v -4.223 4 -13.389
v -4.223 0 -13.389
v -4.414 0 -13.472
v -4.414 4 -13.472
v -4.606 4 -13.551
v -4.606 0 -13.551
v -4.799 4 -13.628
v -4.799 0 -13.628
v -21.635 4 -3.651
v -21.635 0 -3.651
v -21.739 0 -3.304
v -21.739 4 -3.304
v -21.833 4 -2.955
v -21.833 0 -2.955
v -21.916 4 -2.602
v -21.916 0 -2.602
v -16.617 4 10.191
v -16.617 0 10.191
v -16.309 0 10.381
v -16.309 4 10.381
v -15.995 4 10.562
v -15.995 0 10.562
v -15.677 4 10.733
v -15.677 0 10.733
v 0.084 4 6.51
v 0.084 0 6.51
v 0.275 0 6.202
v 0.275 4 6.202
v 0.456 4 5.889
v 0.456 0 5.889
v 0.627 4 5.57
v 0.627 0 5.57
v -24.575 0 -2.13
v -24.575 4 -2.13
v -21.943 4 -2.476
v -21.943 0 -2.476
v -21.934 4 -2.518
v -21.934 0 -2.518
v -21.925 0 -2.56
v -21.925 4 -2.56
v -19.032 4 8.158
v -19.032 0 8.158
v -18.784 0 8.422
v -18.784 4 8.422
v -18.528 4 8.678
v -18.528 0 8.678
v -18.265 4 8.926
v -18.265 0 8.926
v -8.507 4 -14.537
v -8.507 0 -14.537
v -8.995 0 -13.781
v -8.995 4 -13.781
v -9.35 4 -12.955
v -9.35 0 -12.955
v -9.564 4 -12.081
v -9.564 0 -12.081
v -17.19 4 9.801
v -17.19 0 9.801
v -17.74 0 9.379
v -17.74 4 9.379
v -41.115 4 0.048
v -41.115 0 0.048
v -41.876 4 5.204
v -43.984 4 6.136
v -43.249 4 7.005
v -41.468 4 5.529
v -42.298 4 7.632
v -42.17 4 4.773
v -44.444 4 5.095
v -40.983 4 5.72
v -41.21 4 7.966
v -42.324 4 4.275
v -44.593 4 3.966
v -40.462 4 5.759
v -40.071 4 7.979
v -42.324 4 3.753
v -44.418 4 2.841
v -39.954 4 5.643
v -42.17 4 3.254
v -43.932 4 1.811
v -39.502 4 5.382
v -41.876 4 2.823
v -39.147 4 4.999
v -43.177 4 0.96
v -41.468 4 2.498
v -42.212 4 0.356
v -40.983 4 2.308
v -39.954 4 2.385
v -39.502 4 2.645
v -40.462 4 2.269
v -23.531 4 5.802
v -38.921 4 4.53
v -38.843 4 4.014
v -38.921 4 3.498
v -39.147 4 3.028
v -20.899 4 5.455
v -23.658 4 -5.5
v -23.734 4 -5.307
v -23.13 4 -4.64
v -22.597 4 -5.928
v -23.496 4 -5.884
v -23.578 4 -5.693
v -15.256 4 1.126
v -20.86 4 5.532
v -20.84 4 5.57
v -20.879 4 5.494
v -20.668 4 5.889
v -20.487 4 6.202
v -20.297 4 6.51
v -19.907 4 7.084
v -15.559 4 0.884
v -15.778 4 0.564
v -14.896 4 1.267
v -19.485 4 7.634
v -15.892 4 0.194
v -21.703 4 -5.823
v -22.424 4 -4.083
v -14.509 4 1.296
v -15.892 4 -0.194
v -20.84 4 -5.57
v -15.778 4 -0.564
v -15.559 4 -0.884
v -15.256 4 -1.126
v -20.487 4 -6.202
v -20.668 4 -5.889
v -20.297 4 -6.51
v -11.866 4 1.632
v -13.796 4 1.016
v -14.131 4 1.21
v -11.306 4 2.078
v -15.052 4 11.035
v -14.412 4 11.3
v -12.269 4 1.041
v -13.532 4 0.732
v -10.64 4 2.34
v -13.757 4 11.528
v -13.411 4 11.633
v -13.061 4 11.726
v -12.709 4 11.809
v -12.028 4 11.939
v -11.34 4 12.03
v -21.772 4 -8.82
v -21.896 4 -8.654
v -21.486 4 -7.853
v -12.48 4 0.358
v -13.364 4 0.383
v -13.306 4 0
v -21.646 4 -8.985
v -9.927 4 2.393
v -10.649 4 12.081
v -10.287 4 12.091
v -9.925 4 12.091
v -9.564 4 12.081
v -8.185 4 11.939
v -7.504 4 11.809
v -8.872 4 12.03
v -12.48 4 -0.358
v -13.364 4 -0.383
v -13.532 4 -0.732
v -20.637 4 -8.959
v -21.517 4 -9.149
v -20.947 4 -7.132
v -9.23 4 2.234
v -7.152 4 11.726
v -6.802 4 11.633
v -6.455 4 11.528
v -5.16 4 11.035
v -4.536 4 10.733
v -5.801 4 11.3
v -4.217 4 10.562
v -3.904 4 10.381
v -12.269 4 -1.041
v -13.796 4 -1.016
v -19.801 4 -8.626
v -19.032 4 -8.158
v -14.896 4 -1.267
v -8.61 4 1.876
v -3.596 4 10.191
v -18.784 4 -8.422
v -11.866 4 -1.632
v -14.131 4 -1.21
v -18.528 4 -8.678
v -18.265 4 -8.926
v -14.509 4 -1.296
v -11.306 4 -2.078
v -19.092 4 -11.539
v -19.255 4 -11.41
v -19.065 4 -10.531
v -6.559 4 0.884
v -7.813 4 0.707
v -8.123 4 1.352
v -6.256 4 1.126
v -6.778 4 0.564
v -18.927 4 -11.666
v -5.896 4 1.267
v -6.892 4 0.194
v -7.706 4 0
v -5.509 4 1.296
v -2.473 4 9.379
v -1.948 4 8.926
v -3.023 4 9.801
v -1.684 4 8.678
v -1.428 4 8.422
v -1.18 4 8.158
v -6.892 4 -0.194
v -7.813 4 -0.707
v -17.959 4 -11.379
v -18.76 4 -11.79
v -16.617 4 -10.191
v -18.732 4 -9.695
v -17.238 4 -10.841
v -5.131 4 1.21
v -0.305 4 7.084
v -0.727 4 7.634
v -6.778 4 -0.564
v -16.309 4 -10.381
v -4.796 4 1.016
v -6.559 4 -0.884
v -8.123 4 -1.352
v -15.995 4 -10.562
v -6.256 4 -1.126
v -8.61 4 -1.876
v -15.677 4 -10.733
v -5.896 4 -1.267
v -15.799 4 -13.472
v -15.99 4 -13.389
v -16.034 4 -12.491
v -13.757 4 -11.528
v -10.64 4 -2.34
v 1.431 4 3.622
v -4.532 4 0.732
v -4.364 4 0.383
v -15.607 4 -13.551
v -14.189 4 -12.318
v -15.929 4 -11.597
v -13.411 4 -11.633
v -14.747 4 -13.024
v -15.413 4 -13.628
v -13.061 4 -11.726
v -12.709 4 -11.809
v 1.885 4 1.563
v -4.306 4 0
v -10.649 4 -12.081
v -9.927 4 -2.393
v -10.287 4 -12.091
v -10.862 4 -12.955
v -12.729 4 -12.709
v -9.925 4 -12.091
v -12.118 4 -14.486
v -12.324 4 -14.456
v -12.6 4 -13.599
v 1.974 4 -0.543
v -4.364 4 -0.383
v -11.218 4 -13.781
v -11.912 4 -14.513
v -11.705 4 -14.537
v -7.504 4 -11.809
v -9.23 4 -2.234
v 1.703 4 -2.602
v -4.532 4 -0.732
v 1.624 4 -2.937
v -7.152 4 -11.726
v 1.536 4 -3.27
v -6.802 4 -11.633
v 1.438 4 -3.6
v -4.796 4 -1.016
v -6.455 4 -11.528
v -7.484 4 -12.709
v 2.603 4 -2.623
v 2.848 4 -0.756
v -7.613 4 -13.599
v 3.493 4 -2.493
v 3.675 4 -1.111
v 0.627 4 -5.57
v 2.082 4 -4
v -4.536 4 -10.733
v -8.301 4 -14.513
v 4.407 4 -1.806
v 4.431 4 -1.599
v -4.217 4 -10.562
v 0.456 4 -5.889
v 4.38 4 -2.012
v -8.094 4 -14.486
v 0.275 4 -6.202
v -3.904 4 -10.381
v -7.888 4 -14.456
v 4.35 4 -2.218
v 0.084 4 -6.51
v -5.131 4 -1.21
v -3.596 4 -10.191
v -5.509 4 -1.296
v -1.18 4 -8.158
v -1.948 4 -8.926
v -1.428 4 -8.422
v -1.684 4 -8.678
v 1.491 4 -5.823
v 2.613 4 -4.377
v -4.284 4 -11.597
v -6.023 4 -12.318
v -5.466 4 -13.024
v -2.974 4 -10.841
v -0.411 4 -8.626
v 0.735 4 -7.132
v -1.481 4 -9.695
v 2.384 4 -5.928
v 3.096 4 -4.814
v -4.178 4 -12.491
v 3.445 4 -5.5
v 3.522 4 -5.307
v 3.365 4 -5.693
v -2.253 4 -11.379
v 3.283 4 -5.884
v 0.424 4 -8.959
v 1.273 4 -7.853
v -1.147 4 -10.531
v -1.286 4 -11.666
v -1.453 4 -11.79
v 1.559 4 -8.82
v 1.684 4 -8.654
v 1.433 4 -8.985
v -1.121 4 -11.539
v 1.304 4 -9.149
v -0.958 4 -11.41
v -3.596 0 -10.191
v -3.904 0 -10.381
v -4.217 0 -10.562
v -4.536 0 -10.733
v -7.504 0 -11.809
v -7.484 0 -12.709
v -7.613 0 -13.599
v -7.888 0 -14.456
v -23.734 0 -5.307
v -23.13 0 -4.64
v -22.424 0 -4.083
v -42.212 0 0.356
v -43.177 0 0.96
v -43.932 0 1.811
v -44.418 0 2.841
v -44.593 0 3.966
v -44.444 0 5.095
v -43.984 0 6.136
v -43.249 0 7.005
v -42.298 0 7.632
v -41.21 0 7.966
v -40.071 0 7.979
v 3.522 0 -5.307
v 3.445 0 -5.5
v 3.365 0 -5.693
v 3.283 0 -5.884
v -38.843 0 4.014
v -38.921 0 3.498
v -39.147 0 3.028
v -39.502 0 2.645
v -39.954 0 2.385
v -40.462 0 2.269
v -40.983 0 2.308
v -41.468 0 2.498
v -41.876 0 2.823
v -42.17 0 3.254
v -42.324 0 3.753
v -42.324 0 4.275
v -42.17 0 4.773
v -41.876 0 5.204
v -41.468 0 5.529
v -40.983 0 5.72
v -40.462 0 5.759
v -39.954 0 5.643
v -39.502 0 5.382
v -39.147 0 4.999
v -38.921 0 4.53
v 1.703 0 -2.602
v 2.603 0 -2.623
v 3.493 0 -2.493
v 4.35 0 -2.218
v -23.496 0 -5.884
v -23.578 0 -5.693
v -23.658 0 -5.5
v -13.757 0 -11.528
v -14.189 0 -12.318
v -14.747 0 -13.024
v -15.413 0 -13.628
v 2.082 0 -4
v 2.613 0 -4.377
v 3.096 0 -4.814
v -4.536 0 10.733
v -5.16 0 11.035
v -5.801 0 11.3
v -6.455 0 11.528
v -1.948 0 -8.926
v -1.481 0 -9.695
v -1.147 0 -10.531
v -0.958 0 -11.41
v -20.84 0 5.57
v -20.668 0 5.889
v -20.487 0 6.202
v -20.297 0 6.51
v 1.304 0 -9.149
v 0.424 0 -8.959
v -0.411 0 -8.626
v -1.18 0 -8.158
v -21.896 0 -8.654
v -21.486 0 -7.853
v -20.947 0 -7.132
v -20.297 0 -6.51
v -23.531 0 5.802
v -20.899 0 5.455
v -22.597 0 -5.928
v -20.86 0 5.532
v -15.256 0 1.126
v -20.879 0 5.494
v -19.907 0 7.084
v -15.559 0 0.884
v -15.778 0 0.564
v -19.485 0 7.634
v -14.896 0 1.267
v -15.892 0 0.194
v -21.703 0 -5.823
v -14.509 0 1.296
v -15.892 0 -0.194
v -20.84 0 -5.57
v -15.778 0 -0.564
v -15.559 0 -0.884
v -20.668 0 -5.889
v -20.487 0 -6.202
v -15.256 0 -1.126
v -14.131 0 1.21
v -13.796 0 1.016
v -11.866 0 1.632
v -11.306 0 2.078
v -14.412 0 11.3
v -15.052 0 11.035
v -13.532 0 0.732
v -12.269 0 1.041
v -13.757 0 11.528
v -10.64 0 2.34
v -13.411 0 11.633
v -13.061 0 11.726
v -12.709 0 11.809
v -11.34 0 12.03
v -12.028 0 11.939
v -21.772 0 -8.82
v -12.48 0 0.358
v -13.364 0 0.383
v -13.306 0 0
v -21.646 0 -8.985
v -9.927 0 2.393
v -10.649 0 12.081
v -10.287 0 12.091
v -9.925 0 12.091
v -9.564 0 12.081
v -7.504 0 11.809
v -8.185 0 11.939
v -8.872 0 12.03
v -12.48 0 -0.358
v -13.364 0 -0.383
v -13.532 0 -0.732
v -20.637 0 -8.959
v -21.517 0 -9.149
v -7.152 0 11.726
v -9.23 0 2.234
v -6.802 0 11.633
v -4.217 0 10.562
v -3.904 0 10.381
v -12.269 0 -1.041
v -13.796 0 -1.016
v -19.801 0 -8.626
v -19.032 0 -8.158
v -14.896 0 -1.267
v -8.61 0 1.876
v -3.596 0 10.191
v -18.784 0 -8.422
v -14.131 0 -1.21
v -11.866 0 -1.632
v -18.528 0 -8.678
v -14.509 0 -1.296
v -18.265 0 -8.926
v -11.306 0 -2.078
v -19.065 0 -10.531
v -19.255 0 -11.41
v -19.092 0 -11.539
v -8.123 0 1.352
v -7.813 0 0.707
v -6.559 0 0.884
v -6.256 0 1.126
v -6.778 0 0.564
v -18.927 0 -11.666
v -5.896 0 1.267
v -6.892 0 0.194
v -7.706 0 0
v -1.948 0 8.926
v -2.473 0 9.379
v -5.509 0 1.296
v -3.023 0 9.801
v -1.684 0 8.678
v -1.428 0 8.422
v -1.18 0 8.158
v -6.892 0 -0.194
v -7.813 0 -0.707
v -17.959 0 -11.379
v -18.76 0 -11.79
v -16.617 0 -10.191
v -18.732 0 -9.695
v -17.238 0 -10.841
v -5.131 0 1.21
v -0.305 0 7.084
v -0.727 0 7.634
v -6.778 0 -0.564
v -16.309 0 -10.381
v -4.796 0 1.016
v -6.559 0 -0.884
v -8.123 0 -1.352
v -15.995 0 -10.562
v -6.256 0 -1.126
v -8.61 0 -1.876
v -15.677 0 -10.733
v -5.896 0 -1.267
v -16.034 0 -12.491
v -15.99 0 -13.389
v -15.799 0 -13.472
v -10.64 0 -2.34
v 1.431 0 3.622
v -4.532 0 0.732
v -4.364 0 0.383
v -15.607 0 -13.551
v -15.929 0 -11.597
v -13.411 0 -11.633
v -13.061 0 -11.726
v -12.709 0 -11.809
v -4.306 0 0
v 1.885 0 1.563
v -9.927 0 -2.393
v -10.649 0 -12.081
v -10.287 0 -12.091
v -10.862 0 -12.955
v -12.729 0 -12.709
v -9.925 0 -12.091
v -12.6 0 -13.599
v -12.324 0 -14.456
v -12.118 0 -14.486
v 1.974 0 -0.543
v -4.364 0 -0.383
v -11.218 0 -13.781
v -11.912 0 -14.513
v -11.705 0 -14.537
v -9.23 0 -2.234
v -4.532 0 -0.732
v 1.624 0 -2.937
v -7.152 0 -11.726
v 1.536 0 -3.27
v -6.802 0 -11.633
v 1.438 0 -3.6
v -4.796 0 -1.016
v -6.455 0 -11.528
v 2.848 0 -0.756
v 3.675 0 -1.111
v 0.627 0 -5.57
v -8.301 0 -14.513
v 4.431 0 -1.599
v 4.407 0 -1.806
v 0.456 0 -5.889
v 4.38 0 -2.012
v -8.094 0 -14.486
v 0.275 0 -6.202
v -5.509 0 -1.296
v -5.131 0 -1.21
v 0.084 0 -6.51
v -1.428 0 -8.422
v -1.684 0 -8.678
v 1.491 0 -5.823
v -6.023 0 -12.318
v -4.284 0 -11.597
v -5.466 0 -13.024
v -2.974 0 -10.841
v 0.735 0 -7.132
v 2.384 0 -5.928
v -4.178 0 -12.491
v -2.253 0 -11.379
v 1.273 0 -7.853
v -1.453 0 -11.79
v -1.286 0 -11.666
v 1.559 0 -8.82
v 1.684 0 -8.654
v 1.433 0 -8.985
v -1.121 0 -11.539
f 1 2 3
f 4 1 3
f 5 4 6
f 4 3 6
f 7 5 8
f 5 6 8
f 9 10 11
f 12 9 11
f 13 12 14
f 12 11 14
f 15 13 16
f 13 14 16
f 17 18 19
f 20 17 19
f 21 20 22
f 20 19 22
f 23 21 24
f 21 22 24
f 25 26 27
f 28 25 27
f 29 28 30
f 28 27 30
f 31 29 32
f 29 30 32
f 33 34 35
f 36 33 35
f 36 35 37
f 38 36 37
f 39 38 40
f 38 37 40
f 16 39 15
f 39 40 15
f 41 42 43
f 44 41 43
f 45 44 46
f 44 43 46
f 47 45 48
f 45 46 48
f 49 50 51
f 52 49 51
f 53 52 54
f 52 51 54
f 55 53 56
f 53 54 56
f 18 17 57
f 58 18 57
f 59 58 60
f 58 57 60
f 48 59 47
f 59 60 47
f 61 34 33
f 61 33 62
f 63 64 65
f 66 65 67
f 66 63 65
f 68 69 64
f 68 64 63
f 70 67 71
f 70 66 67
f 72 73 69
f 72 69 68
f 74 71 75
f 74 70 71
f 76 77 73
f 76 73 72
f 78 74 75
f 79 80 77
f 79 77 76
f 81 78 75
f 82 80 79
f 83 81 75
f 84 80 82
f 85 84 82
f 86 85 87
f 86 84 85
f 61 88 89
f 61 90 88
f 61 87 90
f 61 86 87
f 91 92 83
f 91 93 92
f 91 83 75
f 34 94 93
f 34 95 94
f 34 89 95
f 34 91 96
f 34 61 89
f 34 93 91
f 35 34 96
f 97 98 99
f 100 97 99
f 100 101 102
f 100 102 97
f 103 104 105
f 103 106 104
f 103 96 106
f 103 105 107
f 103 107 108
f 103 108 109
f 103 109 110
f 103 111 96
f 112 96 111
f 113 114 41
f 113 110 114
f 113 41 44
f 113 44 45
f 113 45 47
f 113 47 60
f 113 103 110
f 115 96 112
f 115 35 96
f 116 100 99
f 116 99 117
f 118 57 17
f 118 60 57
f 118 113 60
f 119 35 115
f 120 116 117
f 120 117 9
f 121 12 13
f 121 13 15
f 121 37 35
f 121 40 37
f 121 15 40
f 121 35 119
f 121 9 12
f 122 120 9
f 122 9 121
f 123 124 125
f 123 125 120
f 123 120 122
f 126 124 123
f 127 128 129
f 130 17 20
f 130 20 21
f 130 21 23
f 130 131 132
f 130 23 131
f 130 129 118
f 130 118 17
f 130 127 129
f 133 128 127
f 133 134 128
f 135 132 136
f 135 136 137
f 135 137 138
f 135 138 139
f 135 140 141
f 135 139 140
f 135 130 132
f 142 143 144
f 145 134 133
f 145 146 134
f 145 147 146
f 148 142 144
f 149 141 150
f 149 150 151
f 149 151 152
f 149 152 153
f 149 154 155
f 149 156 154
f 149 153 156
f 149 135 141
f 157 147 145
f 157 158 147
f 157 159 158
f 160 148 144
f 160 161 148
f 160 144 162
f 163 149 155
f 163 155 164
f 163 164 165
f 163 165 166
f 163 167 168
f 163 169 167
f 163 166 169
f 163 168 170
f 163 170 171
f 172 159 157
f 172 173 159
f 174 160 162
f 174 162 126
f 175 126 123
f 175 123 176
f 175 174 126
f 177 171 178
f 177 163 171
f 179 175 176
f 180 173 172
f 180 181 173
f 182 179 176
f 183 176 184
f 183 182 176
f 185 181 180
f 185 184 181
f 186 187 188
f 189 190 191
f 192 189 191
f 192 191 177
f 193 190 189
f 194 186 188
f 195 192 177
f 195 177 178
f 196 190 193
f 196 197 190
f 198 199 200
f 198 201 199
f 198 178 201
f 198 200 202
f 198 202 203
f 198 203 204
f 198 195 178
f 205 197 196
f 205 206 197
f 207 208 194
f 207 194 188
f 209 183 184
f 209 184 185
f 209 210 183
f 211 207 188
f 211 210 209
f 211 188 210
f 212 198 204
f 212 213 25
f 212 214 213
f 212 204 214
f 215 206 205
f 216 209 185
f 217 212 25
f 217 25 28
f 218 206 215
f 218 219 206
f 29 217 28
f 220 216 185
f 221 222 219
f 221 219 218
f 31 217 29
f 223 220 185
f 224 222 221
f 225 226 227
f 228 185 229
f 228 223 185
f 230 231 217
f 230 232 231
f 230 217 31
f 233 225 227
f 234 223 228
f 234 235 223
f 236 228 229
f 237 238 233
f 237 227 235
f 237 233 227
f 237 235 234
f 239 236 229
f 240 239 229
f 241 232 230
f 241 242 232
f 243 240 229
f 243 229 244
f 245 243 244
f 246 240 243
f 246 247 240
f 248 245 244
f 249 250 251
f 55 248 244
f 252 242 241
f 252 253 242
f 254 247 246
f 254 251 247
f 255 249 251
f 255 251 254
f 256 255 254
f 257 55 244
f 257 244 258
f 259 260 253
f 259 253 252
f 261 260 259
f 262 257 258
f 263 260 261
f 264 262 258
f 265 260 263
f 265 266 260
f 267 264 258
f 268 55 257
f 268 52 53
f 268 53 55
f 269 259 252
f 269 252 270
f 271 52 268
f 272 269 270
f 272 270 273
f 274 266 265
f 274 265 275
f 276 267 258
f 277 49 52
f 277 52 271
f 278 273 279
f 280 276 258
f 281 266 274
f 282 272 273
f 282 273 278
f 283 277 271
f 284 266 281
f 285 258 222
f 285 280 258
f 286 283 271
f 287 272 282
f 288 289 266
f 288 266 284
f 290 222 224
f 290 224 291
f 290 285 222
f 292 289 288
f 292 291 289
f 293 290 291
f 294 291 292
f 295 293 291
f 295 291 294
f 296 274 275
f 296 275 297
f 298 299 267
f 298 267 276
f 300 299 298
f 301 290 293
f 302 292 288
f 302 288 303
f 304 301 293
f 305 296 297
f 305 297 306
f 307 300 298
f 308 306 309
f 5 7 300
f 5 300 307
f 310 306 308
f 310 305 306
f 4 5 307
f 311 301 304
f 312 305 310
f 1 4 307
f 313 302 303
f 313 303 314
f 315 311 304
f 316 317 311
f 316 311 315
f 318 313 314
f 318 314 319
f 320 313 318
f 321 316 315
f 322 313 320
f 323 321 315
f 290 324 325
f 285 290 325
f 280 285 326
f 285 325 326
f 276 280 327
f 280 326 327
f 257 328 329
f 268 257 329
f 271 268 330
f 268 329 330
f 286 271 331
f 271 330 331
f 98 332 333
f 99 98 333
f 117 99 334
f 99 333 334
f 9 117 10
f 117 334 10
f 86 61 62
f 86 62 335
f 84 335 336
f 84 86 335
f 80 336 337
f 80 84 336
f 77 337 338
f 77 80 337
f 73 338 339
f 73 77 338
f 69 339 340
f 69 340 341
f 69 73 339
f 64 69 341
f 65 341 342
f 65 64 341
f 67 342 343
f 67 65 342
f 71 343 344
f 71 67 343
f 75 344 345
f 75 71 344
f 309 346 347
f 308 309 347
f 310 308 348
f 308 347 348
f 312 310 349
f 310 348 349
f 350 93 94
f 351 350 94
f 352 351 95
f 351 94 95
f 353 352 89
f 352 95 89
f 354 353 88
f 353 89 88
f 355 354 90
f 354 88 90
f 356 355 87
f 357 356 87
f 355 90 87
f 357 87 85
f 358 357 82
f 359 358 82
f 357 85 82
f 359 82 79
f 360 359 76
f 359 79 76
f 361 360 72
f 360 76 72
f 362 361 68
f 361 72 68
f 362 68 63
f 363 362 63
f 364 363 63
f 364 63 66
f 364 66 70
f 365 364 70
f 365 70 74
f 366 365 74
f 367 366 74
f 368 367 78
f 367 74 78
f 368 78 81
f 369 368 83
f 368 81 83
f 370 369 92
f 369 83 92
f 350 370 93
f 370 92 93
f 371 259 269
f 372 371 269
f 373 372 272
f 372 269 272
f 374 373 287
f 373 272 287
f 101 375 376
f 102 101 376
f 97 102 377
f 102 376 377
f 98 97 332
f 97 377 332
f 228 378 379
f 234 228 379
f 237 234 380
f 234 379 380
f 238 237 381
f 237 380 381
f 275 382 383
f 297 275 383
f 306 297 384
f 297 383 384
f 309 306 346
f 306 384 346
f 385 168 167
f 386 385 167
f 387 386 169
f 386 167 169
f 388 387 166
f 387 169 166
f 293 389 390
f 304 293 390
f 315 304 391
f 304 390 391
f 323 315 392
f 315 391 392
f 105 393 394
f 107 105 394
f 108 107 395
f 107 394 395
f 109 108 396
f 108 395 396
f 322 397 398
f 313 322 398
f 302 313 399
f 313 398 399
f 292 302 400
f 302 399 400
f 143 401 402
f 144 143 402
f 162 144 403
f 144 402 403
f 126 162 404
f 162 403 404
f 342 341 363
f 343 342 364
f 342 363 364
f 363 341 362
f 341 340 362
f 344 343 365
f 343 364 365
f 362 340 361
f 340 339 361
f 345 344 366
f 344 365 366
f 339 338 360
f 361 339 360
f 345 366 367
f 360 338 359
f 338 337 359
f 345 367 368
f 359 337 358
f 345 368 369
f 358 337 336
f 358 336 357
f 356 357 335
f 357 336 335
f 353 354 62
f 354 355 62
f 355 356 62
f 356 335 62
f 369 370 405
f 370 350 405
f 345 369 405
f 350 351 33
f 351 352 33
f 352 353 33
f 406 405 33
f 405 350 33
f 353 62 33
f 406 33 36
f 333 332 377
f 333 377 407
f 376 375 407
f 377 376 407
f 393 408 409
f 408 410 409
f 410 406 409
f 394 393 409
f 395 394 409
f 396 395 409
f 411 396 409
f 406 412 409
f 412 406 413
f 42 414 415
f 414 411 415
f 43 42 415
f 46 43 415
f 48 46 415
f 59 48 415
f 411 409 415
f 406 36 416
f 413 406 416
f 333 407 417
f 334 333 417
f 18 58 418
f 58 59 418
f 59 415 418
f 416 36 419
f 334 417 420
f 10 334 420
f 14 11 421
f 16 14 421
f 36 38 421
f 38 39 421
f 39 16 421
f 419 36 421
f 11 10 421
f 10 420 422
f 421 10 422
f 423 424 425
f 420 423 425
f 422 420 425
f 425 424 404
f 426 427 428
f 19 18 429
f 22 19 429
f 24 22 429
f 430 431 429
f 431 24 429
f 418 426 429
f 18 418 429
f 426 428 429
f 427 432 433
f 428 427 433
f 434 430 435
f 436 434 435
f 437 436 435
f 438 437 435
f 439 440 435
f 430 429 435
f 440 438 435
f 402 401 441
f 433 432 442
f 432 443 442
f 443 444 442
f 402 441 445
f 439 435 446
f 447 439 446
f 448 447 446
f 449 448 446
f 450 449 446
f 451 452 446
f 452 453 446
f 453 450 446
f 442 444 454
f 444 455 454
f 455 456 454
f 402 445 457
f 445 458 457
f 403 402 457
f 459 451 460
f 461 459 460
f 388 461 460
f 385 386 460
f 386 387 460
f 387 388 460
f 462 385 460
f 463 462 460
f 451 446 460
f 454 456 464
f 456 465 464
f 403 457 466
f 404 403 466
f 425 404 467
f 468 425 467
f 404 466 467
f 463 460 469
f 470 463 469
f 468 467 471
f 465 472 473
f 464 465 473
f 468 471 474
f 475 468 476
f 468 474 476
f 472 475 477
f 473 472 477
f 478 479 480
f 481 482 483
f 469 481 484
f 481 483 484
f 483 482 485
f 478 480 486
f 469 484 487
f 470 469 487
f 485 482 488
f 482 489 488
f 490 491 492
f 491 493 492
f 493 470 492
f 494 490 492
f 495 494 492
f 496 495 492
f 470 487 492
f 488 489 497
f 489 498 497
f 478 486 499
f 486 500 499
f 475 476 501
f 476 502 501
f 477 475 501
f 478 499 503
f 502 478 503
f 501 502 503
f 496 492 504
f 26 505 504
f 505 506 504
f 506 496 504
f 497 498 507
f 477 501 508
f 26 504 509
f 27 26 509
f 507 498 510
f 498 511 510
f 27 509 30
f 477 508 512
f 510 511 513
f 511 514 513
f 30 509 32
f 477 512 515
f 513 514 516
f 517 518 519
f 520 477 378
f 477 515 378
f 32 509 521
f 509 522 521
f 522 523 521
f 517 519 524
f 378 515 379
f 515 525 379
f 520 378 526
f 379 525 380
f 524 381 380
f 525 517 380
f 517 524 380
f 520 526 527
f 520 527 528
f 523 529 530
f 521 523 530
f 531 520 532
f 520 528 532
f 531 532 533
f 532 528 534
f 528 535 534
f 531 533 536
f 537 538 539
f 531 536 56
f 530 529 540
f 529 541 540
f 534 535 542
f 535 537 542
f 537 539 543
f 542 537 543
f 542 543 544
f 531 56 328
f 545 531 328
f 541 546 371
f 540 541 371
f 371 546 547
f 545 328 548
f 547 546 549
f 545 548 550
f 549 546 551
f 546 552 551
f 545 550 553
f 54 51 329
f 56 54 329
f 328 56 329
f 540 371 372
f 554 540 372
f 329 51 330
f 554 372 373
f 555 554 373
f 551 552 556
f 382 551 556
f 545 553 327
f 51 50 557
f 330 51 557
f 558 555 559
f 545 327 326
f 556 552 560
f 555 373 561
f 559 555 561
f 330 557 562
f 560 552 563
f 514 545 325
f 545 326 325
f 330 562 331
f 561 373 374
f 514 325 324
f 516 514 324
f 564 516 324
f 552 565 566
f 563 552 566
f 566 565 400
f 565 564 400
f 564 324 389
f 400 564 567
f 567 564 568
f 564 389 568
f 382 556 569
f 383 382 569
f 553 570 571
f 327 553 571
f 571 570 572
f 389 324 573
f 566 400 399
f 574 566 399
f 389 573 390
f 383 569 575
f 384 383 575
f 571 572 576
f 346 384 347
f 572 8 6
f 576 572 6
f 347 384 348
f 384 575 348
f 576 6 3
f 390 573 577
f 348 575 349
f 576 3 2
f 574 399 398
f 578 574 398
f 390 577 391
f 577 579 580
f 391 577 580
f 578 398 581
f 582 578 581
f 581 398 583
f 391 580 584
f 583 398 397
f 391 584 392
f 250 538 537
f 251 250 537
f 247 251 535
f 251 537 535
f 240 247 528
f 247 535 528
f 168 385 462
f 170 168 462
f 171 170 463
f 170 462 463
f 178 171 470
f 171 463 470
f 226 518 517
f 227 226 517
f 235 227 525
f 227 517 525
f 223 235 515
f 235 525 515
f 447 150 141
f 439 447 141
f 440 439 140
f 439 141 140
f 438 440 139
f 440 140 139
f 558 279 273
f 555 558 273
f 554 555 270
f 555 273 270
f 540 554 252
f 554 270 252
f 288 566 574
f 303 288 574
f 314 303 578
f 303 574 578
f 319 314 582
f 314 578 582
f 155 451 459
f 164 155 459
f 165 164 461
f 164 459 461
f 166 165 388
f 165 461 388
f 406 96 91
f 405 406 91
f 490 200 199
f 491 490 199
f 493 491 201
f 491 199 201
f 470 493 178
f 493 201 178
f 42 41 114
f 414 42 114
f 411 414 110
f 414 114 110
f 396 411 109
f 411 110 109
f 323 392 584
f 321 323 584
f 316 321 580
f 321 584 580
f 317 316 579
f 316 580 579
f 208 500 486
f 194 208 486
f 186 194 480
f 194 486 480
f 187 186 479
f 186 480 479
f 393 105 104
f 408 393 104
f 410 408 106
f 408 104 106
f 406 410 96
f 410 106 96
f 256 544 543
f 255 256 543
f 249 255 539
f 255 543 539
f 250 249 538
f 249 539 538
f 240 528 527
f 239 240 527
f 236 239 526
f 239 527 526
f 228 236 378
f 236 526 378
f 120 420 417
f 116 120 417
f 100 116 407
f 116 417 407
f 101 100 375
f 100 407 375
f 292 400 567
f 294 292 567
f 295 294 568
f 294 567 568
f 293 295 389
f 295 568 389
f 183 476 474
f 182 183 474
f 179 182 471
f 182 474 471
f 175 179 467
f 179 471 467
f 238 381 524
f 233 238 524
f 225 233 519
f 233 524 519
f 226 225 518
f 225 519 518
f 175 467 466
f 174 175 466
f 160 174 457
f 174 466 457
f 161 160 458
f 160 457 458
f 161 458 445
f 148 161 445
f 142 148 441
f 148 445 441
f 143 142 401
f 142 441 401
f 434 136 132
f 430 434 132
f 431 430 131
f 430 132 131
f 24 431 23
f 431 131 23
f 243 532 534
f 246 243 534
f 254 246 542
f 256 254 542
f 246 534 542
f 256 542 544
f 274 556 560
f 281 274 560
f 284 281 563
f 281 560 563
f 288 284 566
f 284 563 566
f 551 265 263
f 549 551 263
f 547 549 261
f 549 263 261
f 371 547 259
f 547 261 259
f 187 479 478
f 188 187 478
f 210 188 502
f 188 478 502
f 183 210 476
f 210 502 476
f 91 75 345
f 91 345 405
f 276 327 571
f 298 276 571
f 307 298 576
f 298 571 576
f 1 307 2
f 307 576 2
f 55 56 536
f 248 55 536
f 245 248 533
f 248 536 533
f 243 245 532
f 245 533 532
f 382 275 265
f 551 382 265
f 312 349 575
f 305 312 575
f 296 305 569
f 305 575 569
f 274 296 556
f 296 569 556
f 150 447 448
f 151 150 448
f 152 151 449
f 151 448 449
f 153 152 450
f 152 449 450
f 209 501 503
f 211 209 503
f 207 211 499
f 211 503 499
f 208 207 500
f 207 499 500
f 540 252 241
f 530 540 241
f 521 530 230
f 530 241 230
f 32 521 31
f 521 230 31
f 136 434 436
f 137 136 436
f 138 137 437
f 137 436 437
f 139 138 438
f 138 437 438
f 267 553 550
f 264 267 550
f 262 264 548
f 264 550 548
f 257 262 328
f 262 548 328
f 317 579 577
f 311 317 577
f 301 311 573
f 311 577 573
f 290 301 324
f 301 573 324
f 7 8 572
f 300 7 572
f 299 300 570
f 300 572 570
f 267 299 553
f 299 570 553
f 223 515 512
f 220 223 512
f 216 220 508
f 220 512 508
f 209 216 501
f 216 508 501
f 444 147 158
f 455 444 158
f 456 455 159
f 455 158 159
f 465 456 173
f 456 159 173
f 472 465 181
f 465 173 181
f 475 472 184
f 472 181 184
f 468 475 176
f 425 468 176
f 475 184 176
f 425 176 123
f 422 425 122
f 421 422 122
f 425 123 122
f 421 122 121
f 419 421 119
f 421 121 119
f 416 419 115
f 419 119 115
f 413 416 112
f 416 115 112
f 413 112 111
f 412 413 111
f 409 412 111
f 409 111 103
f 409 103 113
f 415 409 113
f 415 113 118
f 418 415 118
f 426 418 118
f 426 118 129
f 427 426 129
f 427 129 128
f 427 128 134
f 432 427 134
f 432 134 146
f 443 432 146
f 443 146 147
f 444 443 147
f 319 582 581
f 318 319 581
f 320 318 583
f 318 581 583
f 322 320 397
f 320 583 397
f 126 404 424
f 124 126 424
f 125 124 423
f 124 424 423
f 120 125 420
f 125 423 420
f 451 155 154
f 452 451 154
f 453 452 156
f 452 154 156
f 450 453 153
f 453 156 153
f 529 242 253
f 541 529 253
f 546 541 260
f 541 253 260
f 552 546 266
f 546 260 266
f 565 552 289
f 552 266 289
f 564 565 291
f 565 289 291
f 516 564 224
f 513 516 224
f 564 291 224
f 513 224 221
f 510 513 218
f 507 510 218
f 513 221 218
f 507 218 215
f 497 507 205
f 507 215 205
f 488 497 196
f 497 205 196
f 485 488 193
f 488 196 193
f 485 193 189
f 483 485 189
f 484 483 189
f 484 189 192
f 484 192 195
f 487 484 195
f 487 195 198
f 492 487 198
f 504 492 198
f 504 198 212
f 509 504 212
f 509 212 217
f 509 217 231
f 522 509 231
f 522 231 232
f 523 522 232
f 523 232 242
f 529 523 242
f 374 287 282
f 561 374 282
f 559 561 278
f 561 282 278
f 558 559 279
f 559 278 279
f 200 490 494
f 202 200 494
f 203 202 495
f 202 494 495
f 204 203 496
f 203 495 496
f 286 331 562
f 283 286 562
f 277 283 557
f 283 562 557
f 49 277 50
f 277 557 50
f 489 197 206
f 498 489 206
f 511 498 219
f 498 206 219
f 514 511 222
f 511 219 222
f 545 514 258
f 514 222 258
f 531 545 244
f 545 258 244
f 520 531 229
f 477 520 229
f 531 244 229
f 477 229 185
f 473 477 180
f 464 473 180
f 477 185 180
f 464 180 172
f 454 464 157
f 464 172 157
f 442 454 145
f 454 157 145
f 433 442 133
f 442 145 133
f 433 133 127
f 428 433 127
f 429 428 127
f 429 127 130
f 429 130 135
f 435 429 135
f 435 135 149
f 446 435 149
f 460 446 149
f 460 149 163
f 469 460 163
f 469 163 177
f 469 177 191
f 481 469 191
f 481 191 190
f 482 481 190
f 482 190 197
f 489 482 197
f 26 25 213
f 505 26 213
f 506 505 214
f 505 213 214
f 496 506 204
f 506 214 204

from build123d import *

# Parameters (mm, degrees)
SKETCH1_R           = 1.5
BOSS_EXTRUDE1_DEPTH = 4
SKETCH3_R           = 1.75
BOSS_EXTRUDE2_DEPTH = 4
CUT_EXTRUDE1_DEPTH  = 4
CUT_EXTRUDE2_REACH  = 6
SKETCH5_R           = 1.3
SKETCH5_R_2         = 2.4


with BuildPart() as part:
    # Sketch1 → Boss-Extrude1 (new body)
    with BuildSketch(Plane(origin=(0, 0, 0), x_dir=(1, 0, 0), z_dir=(0, 1, 0))):
        with BuildLine():
            Line((20.643657446, 4), (2.081641936, 4))
            ThreePointArc((2.081641936, 4), (2.861028333, 4.588201733), (3.521749436, 5.30713988))
            ThreePointArc((3.521749436, 5.30713988), (3.405395609, 5.596745198), (3.282888305, 5.883801663))
            ThreePointArc((3.282888305, 5.883801663), (1.93527598, 5.894040025), (0.627094961, 5.57027124))
            ThreePointArc((0.627094961, 5.57027124), (0.366286148, 6.046375), (0.084372603, 6.510293938))
            ThreePointArc((0.084372603, 6.510293938), (1.018855105, 7.48132754), (1.683794586, 8.65351323))
            ThreePointArc((1.683794586, 8.65351323), (1.496450048, 8.903135899), (1.303821399, 9.148703928))
            ThreePointArc((1.303821399, 9.148703928), (-0.000522033, 8.809805691), (-1.180330337, 8.158486898))
            ThreePointArc((-1.180330337, 8.158486898), (-1.555477026, 8.550865528), (-1.947855656, 8.926012217))
            ThreePointArc((-1.947855656, 8.926012217), (-1.296536862, 10.105820521), (-0.957638625, 11.410163953))
            ThreePointArc((-0.957638625, 11.410163953), (-1.203206655, 11.602792602), (-1.452829324, 11.79013714))
            ThreePointArc((-1.452829324, 11.79013714), (-2.625015014, 11.125197659), (-3.596048616, 10.190715157))
            ThreePointArc((-3.596048616, 10.190715157), (-4.059967554, 10.472628702), (-4.536071314, 10.733437515))
            ThreePointArc((-4.536071314, 10.733437515), (-4.212302529, 12.041618533), (-4.222540891, 13.389230859))
            ThreePointArc((-4.222540891, 13.389230859), (-4.509597355, 13.511738163), (-4.799202674, 13.62809199))
            ThreePointArc((-4.799202674, 13.62809199), (-5.759348103, 12.682425791), (-6.455432668, 11.528463019))
            ThreePointArc((-6.455432668, 11.528463019), (-6.976508546, 11.680699536), (-7.503891752, 11.809396783))
            ThreePointArc((-7.503891752, 11.809396783), (-7.529737283, 13.156800143), (-7.888414517, 14.455843809))
            ThreePointArc((-7.888414517, 14.455843809), (-8.197396993, 14.499881098), (-8.507248835, 14.537314892))
            ThreePointArc((-8.507248835, 14.537314892), (-9.18992168, 13.375367565), (-9.563620196, 12.080565177))
            ThreePointArc((-9.563620196, 12.080565177), (-10.106342554, 12.09275), (-10.649064912, 12.080565177))
            ThreePointArc((-10.649064912, 12.080565177), (-11.022763428, 13.375367565), (-11.705436272, 14.537314892))
            ThreePointArc((-11.705436272, 14.537314892), (-12.015288115, 14.499881098), (-12.324270591, 14.455843809))
            ThreePointArc((-12.324270591, 14.455843809), (-12.682947825, 13.156800143), (-12.708793355, 11.809396783))
            ThreePointArc((-12.708793355, 11.809396783), (-13.236176561, 11.680699536), (-13.757252439, 11.528463019))
            ThreePointArc((-13.757252439, 11.528463019), (-14.453337005, 12.682425791), (-15.413482434, 13.62809199))
            ThreePointArc((-15.413482434, 13.62809199), (-15.703087752, 13.511738163), (-15.990144217, 13.389230859))
            ThreePointArc((-15.990144217, 13.389230859), (-16.000382579, 12.041618533), (-15.676613793, 10.733437515))
            ThreePointArc((-15.676613793, 10.733437515), (-16.152717554, 10.472628702), (-16.616636492, 10.190715157))
            ThreePointArc((-16.616636492, 10.190715157), (-17.587670094, 11.125197659), (-18.759855783, 11.79013714))
            ThreePointArc((-18.759855783, 11.79013714), (-19.009478453, 11.602792602), (-19.255046482, 11.410163953))
            ThreePointArc((-19.255046482, 11.410163953), (-18.916148245, 10.105820521), (-18.264829452, 8.926012217))
            ThreePointArc((-18.264829452, 8.926012217), (-18.657208082, 8.550865528), (-19.032354771, 8.158486898))
            ThreePointArc((-19.032354771, 8.158486898), (-20.212163074, 8.809805691), (-21.516506507, 9.148703928))
            ThreePointArc((-21.516506507, 9.148703928), (-21.709135156, 8.903135899), (-21.896479694, 8.65351323))
            ThreePointArc((-21.896479694, 8.65351323), (-21.231540213, 7.48132754), (-20.297057711, 6.510293938))
            ThreePointArc((-20.297057711, 6.510293938), (-20.578971255, 6.046375), (-20.839780068, 5.57027124))
            ThreePointArc((-20.839780068, 5.57027124), (-22.147961087, 5.894040025), (-23.495573413, 5.883801663))
            ThreePointArc((-23.495573413, 5.883801663), (-23.618080717, 5.596745198), (-23.734434544, 5.30713988))
            ThreePointArc((-23.734434544, 5.30713988), (-22.788768345, 4.346994451), (-21.634805572, 3.650909885))
            ThreePointArc((-21.634805572, 3.650909885), (-21.78704209, 3.129834008), (-21.915739337, 2.602450802))
            ThreePointArc((-21.915739337, 2.602450802), (-23.263142697, 2.576605271), (-24.562186363, 2.217928037))
            ThreePointArc((-24.562186363, 2.217928037), (-24.606223651, 1.908945561), (-24.643657446, 1.599093719))
            ThreePointArc((-24.643657446, 1.599093719), (-23.481710119, 0.916420874), (-22.186907731, 0.542722358))
            ThreePointArc((-22.186907731, 0.542722358), (-22.199092554, 0), (-22.186907731, -0.542722358))
            ThreePointArc((-22.186907731, -0.542722358), (-23.481710119, -0.916420874), (-24.643657446, -1.599093719))
            ThreePointArc((-24.643657446, -1.599093719), (-24.606223651, -1.908945561), (-24.562186363, -2.217928037))
            ThreePointArc((-24.562186363, -2.217928037), (-23.263142697, -2.576605271), (-21.915739337, -2.602450802))
            ThreePointArc((-21.915739337, -2.602450802), (-21.78704209, -3.129834008), (-21.634805572, -3.650909885))
            ThreePointArc((-21.634805572, -3.650909885), (-22.788768345, -4.346994451), (-23.734434544, -5.30713988))
            ThreePointArc((-23.734434544, -5.30713988), (-23.618080717, -5.596745198), (-23.495573413, -5.883801663))
            ThreePointArc((-23.495573413, -5.883801663), (-22.147961087, -5.894040025), (-20.839780068, -5.57027124))
            ThreePointArc((-20.839780068, -5.57027124), (-20.578971255, -6.046375), (-20.297057711, -6.510293938))
            ThreePointArc((-20.297057711, -6.510293938), (-21.231540213, -7.48132754), (-21.896479694, -8.65351323))
            ThreePointArc((-21.896479694, -8.65351323), (-21.709135156, -8.903135899), (-21.516506507, -9.148703928))
            ThreePointArc((-21.516506507, -9.148703928), (-20.212163074, -8.809805691), (-19.032354771, -8.158486898))
            ThreePointArc((-19.032354771, -8.158486898), (-18.657208082, -8.550865528), (-18.264829452, -8.926012217))
            ThreePointArc((-18.264829452, -8.926012217), (-18.916148245, -10.105820521), (-19.255046482, -11.410163953))
            ThreePointArc((-19.255046482, -11.410163953), (-19.009478453, -11.602792602), (-18.759855783, -11.79013714))
            ThreePointArc((-18.759855783, -11.79013714), (-17.587670094, -11.125197659), (-16.616636492, -10.190715157))
            ThreePointArc((-16.616636492, -10.190715157), (-16.152717554, -10.472628702), (-15.676613793, -10.733437515))
            ThreePointArc((-15.676613793, -10.733437515), (-16.000382579, -12.041618533), (-15.990144217, -13.389230859))
            ThreePointArc((-15.990144217, -13.389230859), (-15.703087752, -13.511738163), (-15.413482434, -13.62809199))
            ThreePointArc((-15.413482434, -13.62809199), (-14.453337005, -12.682425791), (-13.757252439, -11.528463019))
            ThreePointArc((-13.757252439, -11.528463019), (-13.236176561, -11.680699536), (-12.708793355, -11.809396783))
            ThreePointArc((-12.708793355, -11.809396783), (-12.682947825, -13.156800143), (-12.324270591, -14.455843809))
            ThreePointArc((-12.324270591, -14.455843809), (-12.015288115, -14.499881098), (-11.705436272, -14.537314892))
            ThreePointArc((-11.705436272, -14.537314892), (-11.022763428, -13.375367565), (-10.649064912, -12.080565177))
            ThreePointArc((-10.649064912, -12.080565177), (-10.106342554, -12.09275), (-9.563620196, -12.080565177))
            ThreePointArc((-9.563620196, -12.080565177), (-9.18992168, -13.375367565), (-8.507248835, -14.537314892))
            ThreePointArc((-8.507248835, -14.537314892), (-8.197396993, -14.499881098), (-7.888414517, -14.455843809))
            ThreePointArc((-7.888414517, -14.455843809), (-7.529737283, -13.156800143), (-7.503891752, -11.809396783))
            ThreePointArc((-7.503891752, -11.809396783), (-6.976508546, -11.680699536), (-6.455432668, -11.528463019))
            ThreePointArc((-6.455432668, -11.528463019), (-5.759348103, -12.682425791), (-4.799202674, -13.62809199))
            ThreePointArc((-4.799202674, -13.62809199), (-4.509597355, -13.511738163), (-4.222540891, -13.389230859))
            ThreePointArc((-4.222540891, -13.389230859), (-4.212302529, -12.041618533), (-4.536071314, -10.733437515))
            ThreePointArc((-4.536071314, -10.733437515), (-4.059967554, -10.472628702), (-3.596048616, -10.190715157))
            ThreePointArc((-3.596048616, -10.190715157), (-2.625015014, -11.125197659), (-1.452829324, -11.79013714))
            ThreePointArc((-1.452829324, -11.79013714), (-1.203206655, -11.602792602), (-0.957638625, -11.410163953))
            ThreePointArc((-0.957638625, -11.410163953), (-1.296536862, -10.105820521), (-1.947855656, -8.926012217))
            ThreePointArc((-1.947855656, -8.926012217), (-1.555477026, -8.550865528), (-1.180330337, -8.158486898))
            ThreePointArc((-1.180330337, -8.158486898), (-0.000522033, -8.809805691), (1.303821399, -9.148703928))
            ThreePointArc((1.303821399, -9.148703928), (1.496450048, -8.903135899), (1.683794586, -8.65351323))
            ThreePointArc((1.683794586, -8.65351323), (1.018855105, -7.48132754), (0.084372603, -6.510293938))
            ThreePointArc((0.084372603, -6.510293938), (0.366286148, -6.046375), (0.627094961, -5.57027124))
            ThreePointArc((0.627094961, -5.57027124), (1.93527598, -5.894040025), (3.282888305, -5.883801663))
            ThreePointArc((3.282888305, -5.883801663), (3.405395609, -5.596745198), (3.521749436, -5.30713988))
            ThreePointArc((3.521749436, -5.30713988), (2.861028333, -4.588201733), (2.081641936, -4))
            Line((2.081641936, -4), (20.643657446, -4))
            ThreePointArc((20.643657446, -4), (24.643657446, 0), (20.643657446, 4))
        make_face()
        with Locations((-10.106342554, 0)):
            Circle(SKETCH1_R, mode=Mode.SUBTRACT)
        with Locations((20.643657446, 0)):
            Circle(SKETCH1_R, mode=Mode.SUBTRACT)
    extrude(amount=BOSS_EXTRUDE1_DEPTH)

    # Sketch3 → Boss-Extrude2 (add)
    with BuildSketch(Plane(origin=(0, 4, 0), x_dir=(1, 0, 0), z_dir=(0, 1, 0))):
        with BuildLine():
            ThreePointArc((-9.584237785, -3.965779445), (-14.072121999, -0.522104769), (-10.628447323, 3.965779445))
            Line((-10.628447323, 3.965779445), (-41.11537681, -0.047900965))
            ThreePointArc((-41.11537681, -0.047900965), (-44.559051487, -4.53578518), (-40.071167272, -7.979459856))
            Line((-40.071167272, -7.979459856), (-9.584237785, -3.965779445))
        make_face()
        with Locations((-40.593272041, -4.013680411)):
            Circle(SKETCH3_R, mode=Mode.SUBTRACT)
    extrude(amount=-BOSS_EXTRUDE2_DEPTH)

    # Sketch4 → Cut-Extrude1 (cut)
    with BuildSketch(Plane(origin=(0, 4, 0), x_dir=(1, 0, 0), z_dir=(0, 1, 0))):
        with BuildLine():
            ThreePointArc((20.643657446, -4), (24.643657446, 0), (20.643657446, 4))
            Line((20.643657446, 4), (2.081641936, 4))
            Line((2.081641936, 4), (1.43808022, 3.600125745))
            ThreePointArc((1.43808022, 3.600125745), (1.581217534, 3.104116905), (1.70305423, 2.602450802))
            ThreePointArc((1.70305423, 2.602450802), (3.050457589, 2.576605271), (4.349501255, 2.217928037))
            ThreePointArc((4.349501255, 2.217928037), (4.393538544, 1.908945561), (4.430972339, 1.599093719))
            ThreePointArc((4.430972339, 1.599093719), (3.269025011, 0.916420874), (1.974222624, 0.542722358))
            ThreePointArc((1.974222624, 0.542722358), (1.70305423, -2.602450802), (0.627094961, -5.57027124))
            ThreePointArc((0.627094961, -5.57027124), (1.93527598, -5.894040025), (3.282888305, -5.883801663))
            ThreePointArc((3.282888305, -5.883801663), (3.405395609, -5.596745198), (3.521749436, -5.30713988))
            ThreePointArc((3.521749436, -5.30713988), (2.861028333, -4.588201733), (2.081641936, -4))
            Line((2.081641936, -4), (20.643657446, -4))
        make_face()
        with BuildLine():
            ThreePointArc((1.683794586, -8.65351323), (1.018855105, -7.48132754), (0.084372603, -6.510293938))
            ThreePointArc((0.084372603, -6.510293938), (-0.512518948, -7.361599771), (-1.180330337, -8.158486898))
            ThreePointArc((-1.180330337, -8.158486898), (-0.000522033, -8.809805691), (1.303821399, -9.148703928))
            ThreePointArc((1.303821399, -9.148703928), (1.496450048, -8.903135899), (1.683794586, -8.65351323))
        make_face()
        with BuildLine():
            ThreePointArc((-0.957638625, -11.410163953), (-1.296536862, -10.105820521), (-1.947855656, -8.926012217))
            ThreePointArc((-1.947855656, -8.926012217), (-2.744742783, -9.593823606), (-3.596048616, -10.190715157))
            ThreePointArc((-3.596048616, -10.190715157), (-2.625015014, -11.125197659), (-1.452829324, -11.79013714))
            ThreePointArc((-1.452829324, -11.79013714), (-1.203206655, -11.602792602), (-0.957638625, -11.410163953))
        make_face()
        with BuildLine():
            ThreePointArc((-4.222540891, -13.389230859), (-4.212302529, -12.041618533), (-4.536071314, -10.733437515))
            ThreePointArc((-4.536071314, -10.733437515), (-5.478647477, -11.172244217), (-6.455432668, -11.528463019))
            ThreePointArc((-6.455432668, -11.528463019), (-5.759348103, -12.682425791), (-4.799202674, -13.62809199))
            ThreePointArc((-4.799202674, -13.62809199), (-4.509597355, -13.511738163), (-4.222540891, -13.389230859))
        make_face()
        with BuildLine():
            ThreePointArc((-7.888414517, -14.455843809), (-7.529737283, -13.156800143), (-7.503891752, -11.809396783))
            ThreePointArc((-7.503891752, -11.809396783), (-8.527921943, -11.989294847), (-9.563620196, -12.080565177))
            ThreePointArc((-9.563620196, -12.080565177), (-9.18992168, -13.375367565), (-8.507248835, -14.537314892))
            ThreePointArc((-8.507248835, -14.537314892), (-8.197396993, -14.499881098), (-7.888414517, -14.455843809))
        make_face()
        with BuildLine():
            ThreePointArc((-11.705436272, -14.537314892), (-11.022763428, -13.375367565), (-10.649064912, -12.080565177))
            ThreePointArc((-10.649064912, -12.080565177), (-11.684763165, -11.989294847), (-12.708793355, -11.809396783))
            ThreePointArc((-12.708793355, -11.809396783), (-12.682947825, -13.156800143), (-12.324270591, -14.455843809))
            ThreePointArc((-12.324270591, -14.455843809), (-12.015288115, -14.499881098), (-11.705436272, -14.537314892))
        make_face()
        with BuildLine():
            ThreePointArc((-15.413482434, -13.62809199), (-14.453337005, -12.682425791), (-13.757252439, -11.528463019))
            ThreePointArc((-13.757252439, -11.528463019), (-14.734037631, -11.172244217), (-15.676613793, -10.733437515))
            ThreePointArc((-15.676613793, -10.733437515), (-16.000382579, -12.041618533), (-15.990144217, -13.389230859))
            ThreePointArc((-15.990144217, -13.389230859), (-15.703087752, -13.511738163), (-15.413482434, -13.62809199))
        make_face()
        with BuildLine():
            ThreePointArc((-18.759855783, -11.79013714), (-17.587670094, -11.125197659), (-16.616636492, -10.190715157))
            ThreePointArc((-16.616636492, -10.190715157), (-17.467942324, -9.593823606), (-18.264829452, -8.926012217))
            ThreePointArc((-18.264829452, -8.926012217), (-18.916148245, -10.105820521), (-19.255046482, -11.410163953))
            ThreePointArc((-19.255046482, -11.410163953), (-19.009478453, -11.602792602), (-18.759855783, -11.79013714))
        make_face()
        with BuildLine():
            ThreePointArc((-21.516506507, -9.148703928), (-20.212163074, -8.809805691), (-19.032354771, -8.158486898))
            ThreePointArc((-19.032354771, -8.158486898), (-19.70016616, -7.361599771), (-20.297057711, -6.510293938))
            ThreePointArc((-20.297057711, -6.510293938), (-21.231540213, -7.48132754), (-21.896479694, -8.65351323))
            ThreePointArc((-21.896479694, -8.65351323), (-21.709135156, -8.903135899), (-21.516506507, -9.148703928))
        make_face()
        with BuildLine():
            ThreePointArc((-21.942853375, 2.47620963), (-21.92946485, 2.539366405), (-21.915739337, 2.602450802))
            ThreePointArc((-21.915739337, 2.602450802), (-23.263142697, 2.576605271), (-24.562186363, 2.217928037))
            ThreePointArc((-24.562186363, 2.217928037), (-24.56889027, 2.173784387), (-24.575459377, 2.129620475))
            Line((-24.575459377, 2.129620475), (-21.942853375, 2.47620963))
        make_face()
        with BuildLine():
            ThreePointArc((-23.495573413, -5.883801663), (-22.147961087, -5.894040025), (-20.839780068, -5.57027124))
            ThreePointArc((-20.839780068, -5.57027124), (-20.869365339, -5.512888815), (-20.898643838, -5.455349261))
            Line((-20.898643838, -5.455349261), (-23.531249839, -5.801938416))
            ThreePointArc((-23.531249839, -5.801938416), (-23.513474108, -5.842897269), (-23.495573413, -5.883801663))
        make_face()
    extrude(amount=-CUT_EXTRUDE1_DEPTH, mode=Mode.SUBTRACT)

    # Sketch5 → Cut-Extrude2 (cut, up to next)
    with BuildSketch(Plane(origin=(0, 4, 0), x_dir=(1, 0, 0), z_dir=(0, 1, 0)), mode=Mode.PRIVATE) as cut_extrude2_sk1:
        with Locations((-14.606342554, 0)):
            Circle(SKETCH5_R)
    cut_extrude2_tool1 = extrude(cut_extrude2_sk1.sketch, amount=-CUT_EXTRUDE2_REACH, mode=Mode.PRIVATE) & part.part
    add(cut_extrude2_tool1.solids().sort_by_distance((-14.606343, 4, 0))[0], mode=Mode.SUBTRACT)
    # Sketch5 → Cut-Extrude2 (cut, up to next)
    with BuildSketch(Plane(origin=(0, 4, 0), x_dir=(1, 0, 0), z_dir=(0, 1, 0)), mode=Mode.PRIVATE) as cut_extrude2_sk2:
        with Locations((-5.606342554, 0)):
            Circle(SKETCH5_R)
    cut_extrude2_tool2 = extrude(cut_extrude2_sk2.sketch, amount=-CUT_EXTRUDE2_REACH, mode=Mode.PRIVATE) & part.part
    add(cut_extrude2_tool2.solids().sort_by_distance((-5.606343, 4, 0))[0], mode=Mode.SUBTRACT)
    # Sketch5 → Cut-Extrude2 (cut, up to next)
    with BuildSketch(Plane(origin=(0, 4, 0), x_dir=(1, 0, 0), z_dir=(0, 1, 0)), mode=Mode.PRIVATE) as cut_extrude2_sk3:
        with Locations((-10.106342554, 0)):
            Circle(SKETCH5_R_2)
    cut_extrude2_tool3 = extrude(cut_extrude2_sk3.sketch, amount=-CUT_EXTRUDE2_REACH, mode=Mode.PRIVATE) & part.part
    add(cut_extrude2_tool3.solids().sort_by_distance((-10.106343, 4, 0))[0], mode=Mode.SUBTRACT)


solid = part.part
